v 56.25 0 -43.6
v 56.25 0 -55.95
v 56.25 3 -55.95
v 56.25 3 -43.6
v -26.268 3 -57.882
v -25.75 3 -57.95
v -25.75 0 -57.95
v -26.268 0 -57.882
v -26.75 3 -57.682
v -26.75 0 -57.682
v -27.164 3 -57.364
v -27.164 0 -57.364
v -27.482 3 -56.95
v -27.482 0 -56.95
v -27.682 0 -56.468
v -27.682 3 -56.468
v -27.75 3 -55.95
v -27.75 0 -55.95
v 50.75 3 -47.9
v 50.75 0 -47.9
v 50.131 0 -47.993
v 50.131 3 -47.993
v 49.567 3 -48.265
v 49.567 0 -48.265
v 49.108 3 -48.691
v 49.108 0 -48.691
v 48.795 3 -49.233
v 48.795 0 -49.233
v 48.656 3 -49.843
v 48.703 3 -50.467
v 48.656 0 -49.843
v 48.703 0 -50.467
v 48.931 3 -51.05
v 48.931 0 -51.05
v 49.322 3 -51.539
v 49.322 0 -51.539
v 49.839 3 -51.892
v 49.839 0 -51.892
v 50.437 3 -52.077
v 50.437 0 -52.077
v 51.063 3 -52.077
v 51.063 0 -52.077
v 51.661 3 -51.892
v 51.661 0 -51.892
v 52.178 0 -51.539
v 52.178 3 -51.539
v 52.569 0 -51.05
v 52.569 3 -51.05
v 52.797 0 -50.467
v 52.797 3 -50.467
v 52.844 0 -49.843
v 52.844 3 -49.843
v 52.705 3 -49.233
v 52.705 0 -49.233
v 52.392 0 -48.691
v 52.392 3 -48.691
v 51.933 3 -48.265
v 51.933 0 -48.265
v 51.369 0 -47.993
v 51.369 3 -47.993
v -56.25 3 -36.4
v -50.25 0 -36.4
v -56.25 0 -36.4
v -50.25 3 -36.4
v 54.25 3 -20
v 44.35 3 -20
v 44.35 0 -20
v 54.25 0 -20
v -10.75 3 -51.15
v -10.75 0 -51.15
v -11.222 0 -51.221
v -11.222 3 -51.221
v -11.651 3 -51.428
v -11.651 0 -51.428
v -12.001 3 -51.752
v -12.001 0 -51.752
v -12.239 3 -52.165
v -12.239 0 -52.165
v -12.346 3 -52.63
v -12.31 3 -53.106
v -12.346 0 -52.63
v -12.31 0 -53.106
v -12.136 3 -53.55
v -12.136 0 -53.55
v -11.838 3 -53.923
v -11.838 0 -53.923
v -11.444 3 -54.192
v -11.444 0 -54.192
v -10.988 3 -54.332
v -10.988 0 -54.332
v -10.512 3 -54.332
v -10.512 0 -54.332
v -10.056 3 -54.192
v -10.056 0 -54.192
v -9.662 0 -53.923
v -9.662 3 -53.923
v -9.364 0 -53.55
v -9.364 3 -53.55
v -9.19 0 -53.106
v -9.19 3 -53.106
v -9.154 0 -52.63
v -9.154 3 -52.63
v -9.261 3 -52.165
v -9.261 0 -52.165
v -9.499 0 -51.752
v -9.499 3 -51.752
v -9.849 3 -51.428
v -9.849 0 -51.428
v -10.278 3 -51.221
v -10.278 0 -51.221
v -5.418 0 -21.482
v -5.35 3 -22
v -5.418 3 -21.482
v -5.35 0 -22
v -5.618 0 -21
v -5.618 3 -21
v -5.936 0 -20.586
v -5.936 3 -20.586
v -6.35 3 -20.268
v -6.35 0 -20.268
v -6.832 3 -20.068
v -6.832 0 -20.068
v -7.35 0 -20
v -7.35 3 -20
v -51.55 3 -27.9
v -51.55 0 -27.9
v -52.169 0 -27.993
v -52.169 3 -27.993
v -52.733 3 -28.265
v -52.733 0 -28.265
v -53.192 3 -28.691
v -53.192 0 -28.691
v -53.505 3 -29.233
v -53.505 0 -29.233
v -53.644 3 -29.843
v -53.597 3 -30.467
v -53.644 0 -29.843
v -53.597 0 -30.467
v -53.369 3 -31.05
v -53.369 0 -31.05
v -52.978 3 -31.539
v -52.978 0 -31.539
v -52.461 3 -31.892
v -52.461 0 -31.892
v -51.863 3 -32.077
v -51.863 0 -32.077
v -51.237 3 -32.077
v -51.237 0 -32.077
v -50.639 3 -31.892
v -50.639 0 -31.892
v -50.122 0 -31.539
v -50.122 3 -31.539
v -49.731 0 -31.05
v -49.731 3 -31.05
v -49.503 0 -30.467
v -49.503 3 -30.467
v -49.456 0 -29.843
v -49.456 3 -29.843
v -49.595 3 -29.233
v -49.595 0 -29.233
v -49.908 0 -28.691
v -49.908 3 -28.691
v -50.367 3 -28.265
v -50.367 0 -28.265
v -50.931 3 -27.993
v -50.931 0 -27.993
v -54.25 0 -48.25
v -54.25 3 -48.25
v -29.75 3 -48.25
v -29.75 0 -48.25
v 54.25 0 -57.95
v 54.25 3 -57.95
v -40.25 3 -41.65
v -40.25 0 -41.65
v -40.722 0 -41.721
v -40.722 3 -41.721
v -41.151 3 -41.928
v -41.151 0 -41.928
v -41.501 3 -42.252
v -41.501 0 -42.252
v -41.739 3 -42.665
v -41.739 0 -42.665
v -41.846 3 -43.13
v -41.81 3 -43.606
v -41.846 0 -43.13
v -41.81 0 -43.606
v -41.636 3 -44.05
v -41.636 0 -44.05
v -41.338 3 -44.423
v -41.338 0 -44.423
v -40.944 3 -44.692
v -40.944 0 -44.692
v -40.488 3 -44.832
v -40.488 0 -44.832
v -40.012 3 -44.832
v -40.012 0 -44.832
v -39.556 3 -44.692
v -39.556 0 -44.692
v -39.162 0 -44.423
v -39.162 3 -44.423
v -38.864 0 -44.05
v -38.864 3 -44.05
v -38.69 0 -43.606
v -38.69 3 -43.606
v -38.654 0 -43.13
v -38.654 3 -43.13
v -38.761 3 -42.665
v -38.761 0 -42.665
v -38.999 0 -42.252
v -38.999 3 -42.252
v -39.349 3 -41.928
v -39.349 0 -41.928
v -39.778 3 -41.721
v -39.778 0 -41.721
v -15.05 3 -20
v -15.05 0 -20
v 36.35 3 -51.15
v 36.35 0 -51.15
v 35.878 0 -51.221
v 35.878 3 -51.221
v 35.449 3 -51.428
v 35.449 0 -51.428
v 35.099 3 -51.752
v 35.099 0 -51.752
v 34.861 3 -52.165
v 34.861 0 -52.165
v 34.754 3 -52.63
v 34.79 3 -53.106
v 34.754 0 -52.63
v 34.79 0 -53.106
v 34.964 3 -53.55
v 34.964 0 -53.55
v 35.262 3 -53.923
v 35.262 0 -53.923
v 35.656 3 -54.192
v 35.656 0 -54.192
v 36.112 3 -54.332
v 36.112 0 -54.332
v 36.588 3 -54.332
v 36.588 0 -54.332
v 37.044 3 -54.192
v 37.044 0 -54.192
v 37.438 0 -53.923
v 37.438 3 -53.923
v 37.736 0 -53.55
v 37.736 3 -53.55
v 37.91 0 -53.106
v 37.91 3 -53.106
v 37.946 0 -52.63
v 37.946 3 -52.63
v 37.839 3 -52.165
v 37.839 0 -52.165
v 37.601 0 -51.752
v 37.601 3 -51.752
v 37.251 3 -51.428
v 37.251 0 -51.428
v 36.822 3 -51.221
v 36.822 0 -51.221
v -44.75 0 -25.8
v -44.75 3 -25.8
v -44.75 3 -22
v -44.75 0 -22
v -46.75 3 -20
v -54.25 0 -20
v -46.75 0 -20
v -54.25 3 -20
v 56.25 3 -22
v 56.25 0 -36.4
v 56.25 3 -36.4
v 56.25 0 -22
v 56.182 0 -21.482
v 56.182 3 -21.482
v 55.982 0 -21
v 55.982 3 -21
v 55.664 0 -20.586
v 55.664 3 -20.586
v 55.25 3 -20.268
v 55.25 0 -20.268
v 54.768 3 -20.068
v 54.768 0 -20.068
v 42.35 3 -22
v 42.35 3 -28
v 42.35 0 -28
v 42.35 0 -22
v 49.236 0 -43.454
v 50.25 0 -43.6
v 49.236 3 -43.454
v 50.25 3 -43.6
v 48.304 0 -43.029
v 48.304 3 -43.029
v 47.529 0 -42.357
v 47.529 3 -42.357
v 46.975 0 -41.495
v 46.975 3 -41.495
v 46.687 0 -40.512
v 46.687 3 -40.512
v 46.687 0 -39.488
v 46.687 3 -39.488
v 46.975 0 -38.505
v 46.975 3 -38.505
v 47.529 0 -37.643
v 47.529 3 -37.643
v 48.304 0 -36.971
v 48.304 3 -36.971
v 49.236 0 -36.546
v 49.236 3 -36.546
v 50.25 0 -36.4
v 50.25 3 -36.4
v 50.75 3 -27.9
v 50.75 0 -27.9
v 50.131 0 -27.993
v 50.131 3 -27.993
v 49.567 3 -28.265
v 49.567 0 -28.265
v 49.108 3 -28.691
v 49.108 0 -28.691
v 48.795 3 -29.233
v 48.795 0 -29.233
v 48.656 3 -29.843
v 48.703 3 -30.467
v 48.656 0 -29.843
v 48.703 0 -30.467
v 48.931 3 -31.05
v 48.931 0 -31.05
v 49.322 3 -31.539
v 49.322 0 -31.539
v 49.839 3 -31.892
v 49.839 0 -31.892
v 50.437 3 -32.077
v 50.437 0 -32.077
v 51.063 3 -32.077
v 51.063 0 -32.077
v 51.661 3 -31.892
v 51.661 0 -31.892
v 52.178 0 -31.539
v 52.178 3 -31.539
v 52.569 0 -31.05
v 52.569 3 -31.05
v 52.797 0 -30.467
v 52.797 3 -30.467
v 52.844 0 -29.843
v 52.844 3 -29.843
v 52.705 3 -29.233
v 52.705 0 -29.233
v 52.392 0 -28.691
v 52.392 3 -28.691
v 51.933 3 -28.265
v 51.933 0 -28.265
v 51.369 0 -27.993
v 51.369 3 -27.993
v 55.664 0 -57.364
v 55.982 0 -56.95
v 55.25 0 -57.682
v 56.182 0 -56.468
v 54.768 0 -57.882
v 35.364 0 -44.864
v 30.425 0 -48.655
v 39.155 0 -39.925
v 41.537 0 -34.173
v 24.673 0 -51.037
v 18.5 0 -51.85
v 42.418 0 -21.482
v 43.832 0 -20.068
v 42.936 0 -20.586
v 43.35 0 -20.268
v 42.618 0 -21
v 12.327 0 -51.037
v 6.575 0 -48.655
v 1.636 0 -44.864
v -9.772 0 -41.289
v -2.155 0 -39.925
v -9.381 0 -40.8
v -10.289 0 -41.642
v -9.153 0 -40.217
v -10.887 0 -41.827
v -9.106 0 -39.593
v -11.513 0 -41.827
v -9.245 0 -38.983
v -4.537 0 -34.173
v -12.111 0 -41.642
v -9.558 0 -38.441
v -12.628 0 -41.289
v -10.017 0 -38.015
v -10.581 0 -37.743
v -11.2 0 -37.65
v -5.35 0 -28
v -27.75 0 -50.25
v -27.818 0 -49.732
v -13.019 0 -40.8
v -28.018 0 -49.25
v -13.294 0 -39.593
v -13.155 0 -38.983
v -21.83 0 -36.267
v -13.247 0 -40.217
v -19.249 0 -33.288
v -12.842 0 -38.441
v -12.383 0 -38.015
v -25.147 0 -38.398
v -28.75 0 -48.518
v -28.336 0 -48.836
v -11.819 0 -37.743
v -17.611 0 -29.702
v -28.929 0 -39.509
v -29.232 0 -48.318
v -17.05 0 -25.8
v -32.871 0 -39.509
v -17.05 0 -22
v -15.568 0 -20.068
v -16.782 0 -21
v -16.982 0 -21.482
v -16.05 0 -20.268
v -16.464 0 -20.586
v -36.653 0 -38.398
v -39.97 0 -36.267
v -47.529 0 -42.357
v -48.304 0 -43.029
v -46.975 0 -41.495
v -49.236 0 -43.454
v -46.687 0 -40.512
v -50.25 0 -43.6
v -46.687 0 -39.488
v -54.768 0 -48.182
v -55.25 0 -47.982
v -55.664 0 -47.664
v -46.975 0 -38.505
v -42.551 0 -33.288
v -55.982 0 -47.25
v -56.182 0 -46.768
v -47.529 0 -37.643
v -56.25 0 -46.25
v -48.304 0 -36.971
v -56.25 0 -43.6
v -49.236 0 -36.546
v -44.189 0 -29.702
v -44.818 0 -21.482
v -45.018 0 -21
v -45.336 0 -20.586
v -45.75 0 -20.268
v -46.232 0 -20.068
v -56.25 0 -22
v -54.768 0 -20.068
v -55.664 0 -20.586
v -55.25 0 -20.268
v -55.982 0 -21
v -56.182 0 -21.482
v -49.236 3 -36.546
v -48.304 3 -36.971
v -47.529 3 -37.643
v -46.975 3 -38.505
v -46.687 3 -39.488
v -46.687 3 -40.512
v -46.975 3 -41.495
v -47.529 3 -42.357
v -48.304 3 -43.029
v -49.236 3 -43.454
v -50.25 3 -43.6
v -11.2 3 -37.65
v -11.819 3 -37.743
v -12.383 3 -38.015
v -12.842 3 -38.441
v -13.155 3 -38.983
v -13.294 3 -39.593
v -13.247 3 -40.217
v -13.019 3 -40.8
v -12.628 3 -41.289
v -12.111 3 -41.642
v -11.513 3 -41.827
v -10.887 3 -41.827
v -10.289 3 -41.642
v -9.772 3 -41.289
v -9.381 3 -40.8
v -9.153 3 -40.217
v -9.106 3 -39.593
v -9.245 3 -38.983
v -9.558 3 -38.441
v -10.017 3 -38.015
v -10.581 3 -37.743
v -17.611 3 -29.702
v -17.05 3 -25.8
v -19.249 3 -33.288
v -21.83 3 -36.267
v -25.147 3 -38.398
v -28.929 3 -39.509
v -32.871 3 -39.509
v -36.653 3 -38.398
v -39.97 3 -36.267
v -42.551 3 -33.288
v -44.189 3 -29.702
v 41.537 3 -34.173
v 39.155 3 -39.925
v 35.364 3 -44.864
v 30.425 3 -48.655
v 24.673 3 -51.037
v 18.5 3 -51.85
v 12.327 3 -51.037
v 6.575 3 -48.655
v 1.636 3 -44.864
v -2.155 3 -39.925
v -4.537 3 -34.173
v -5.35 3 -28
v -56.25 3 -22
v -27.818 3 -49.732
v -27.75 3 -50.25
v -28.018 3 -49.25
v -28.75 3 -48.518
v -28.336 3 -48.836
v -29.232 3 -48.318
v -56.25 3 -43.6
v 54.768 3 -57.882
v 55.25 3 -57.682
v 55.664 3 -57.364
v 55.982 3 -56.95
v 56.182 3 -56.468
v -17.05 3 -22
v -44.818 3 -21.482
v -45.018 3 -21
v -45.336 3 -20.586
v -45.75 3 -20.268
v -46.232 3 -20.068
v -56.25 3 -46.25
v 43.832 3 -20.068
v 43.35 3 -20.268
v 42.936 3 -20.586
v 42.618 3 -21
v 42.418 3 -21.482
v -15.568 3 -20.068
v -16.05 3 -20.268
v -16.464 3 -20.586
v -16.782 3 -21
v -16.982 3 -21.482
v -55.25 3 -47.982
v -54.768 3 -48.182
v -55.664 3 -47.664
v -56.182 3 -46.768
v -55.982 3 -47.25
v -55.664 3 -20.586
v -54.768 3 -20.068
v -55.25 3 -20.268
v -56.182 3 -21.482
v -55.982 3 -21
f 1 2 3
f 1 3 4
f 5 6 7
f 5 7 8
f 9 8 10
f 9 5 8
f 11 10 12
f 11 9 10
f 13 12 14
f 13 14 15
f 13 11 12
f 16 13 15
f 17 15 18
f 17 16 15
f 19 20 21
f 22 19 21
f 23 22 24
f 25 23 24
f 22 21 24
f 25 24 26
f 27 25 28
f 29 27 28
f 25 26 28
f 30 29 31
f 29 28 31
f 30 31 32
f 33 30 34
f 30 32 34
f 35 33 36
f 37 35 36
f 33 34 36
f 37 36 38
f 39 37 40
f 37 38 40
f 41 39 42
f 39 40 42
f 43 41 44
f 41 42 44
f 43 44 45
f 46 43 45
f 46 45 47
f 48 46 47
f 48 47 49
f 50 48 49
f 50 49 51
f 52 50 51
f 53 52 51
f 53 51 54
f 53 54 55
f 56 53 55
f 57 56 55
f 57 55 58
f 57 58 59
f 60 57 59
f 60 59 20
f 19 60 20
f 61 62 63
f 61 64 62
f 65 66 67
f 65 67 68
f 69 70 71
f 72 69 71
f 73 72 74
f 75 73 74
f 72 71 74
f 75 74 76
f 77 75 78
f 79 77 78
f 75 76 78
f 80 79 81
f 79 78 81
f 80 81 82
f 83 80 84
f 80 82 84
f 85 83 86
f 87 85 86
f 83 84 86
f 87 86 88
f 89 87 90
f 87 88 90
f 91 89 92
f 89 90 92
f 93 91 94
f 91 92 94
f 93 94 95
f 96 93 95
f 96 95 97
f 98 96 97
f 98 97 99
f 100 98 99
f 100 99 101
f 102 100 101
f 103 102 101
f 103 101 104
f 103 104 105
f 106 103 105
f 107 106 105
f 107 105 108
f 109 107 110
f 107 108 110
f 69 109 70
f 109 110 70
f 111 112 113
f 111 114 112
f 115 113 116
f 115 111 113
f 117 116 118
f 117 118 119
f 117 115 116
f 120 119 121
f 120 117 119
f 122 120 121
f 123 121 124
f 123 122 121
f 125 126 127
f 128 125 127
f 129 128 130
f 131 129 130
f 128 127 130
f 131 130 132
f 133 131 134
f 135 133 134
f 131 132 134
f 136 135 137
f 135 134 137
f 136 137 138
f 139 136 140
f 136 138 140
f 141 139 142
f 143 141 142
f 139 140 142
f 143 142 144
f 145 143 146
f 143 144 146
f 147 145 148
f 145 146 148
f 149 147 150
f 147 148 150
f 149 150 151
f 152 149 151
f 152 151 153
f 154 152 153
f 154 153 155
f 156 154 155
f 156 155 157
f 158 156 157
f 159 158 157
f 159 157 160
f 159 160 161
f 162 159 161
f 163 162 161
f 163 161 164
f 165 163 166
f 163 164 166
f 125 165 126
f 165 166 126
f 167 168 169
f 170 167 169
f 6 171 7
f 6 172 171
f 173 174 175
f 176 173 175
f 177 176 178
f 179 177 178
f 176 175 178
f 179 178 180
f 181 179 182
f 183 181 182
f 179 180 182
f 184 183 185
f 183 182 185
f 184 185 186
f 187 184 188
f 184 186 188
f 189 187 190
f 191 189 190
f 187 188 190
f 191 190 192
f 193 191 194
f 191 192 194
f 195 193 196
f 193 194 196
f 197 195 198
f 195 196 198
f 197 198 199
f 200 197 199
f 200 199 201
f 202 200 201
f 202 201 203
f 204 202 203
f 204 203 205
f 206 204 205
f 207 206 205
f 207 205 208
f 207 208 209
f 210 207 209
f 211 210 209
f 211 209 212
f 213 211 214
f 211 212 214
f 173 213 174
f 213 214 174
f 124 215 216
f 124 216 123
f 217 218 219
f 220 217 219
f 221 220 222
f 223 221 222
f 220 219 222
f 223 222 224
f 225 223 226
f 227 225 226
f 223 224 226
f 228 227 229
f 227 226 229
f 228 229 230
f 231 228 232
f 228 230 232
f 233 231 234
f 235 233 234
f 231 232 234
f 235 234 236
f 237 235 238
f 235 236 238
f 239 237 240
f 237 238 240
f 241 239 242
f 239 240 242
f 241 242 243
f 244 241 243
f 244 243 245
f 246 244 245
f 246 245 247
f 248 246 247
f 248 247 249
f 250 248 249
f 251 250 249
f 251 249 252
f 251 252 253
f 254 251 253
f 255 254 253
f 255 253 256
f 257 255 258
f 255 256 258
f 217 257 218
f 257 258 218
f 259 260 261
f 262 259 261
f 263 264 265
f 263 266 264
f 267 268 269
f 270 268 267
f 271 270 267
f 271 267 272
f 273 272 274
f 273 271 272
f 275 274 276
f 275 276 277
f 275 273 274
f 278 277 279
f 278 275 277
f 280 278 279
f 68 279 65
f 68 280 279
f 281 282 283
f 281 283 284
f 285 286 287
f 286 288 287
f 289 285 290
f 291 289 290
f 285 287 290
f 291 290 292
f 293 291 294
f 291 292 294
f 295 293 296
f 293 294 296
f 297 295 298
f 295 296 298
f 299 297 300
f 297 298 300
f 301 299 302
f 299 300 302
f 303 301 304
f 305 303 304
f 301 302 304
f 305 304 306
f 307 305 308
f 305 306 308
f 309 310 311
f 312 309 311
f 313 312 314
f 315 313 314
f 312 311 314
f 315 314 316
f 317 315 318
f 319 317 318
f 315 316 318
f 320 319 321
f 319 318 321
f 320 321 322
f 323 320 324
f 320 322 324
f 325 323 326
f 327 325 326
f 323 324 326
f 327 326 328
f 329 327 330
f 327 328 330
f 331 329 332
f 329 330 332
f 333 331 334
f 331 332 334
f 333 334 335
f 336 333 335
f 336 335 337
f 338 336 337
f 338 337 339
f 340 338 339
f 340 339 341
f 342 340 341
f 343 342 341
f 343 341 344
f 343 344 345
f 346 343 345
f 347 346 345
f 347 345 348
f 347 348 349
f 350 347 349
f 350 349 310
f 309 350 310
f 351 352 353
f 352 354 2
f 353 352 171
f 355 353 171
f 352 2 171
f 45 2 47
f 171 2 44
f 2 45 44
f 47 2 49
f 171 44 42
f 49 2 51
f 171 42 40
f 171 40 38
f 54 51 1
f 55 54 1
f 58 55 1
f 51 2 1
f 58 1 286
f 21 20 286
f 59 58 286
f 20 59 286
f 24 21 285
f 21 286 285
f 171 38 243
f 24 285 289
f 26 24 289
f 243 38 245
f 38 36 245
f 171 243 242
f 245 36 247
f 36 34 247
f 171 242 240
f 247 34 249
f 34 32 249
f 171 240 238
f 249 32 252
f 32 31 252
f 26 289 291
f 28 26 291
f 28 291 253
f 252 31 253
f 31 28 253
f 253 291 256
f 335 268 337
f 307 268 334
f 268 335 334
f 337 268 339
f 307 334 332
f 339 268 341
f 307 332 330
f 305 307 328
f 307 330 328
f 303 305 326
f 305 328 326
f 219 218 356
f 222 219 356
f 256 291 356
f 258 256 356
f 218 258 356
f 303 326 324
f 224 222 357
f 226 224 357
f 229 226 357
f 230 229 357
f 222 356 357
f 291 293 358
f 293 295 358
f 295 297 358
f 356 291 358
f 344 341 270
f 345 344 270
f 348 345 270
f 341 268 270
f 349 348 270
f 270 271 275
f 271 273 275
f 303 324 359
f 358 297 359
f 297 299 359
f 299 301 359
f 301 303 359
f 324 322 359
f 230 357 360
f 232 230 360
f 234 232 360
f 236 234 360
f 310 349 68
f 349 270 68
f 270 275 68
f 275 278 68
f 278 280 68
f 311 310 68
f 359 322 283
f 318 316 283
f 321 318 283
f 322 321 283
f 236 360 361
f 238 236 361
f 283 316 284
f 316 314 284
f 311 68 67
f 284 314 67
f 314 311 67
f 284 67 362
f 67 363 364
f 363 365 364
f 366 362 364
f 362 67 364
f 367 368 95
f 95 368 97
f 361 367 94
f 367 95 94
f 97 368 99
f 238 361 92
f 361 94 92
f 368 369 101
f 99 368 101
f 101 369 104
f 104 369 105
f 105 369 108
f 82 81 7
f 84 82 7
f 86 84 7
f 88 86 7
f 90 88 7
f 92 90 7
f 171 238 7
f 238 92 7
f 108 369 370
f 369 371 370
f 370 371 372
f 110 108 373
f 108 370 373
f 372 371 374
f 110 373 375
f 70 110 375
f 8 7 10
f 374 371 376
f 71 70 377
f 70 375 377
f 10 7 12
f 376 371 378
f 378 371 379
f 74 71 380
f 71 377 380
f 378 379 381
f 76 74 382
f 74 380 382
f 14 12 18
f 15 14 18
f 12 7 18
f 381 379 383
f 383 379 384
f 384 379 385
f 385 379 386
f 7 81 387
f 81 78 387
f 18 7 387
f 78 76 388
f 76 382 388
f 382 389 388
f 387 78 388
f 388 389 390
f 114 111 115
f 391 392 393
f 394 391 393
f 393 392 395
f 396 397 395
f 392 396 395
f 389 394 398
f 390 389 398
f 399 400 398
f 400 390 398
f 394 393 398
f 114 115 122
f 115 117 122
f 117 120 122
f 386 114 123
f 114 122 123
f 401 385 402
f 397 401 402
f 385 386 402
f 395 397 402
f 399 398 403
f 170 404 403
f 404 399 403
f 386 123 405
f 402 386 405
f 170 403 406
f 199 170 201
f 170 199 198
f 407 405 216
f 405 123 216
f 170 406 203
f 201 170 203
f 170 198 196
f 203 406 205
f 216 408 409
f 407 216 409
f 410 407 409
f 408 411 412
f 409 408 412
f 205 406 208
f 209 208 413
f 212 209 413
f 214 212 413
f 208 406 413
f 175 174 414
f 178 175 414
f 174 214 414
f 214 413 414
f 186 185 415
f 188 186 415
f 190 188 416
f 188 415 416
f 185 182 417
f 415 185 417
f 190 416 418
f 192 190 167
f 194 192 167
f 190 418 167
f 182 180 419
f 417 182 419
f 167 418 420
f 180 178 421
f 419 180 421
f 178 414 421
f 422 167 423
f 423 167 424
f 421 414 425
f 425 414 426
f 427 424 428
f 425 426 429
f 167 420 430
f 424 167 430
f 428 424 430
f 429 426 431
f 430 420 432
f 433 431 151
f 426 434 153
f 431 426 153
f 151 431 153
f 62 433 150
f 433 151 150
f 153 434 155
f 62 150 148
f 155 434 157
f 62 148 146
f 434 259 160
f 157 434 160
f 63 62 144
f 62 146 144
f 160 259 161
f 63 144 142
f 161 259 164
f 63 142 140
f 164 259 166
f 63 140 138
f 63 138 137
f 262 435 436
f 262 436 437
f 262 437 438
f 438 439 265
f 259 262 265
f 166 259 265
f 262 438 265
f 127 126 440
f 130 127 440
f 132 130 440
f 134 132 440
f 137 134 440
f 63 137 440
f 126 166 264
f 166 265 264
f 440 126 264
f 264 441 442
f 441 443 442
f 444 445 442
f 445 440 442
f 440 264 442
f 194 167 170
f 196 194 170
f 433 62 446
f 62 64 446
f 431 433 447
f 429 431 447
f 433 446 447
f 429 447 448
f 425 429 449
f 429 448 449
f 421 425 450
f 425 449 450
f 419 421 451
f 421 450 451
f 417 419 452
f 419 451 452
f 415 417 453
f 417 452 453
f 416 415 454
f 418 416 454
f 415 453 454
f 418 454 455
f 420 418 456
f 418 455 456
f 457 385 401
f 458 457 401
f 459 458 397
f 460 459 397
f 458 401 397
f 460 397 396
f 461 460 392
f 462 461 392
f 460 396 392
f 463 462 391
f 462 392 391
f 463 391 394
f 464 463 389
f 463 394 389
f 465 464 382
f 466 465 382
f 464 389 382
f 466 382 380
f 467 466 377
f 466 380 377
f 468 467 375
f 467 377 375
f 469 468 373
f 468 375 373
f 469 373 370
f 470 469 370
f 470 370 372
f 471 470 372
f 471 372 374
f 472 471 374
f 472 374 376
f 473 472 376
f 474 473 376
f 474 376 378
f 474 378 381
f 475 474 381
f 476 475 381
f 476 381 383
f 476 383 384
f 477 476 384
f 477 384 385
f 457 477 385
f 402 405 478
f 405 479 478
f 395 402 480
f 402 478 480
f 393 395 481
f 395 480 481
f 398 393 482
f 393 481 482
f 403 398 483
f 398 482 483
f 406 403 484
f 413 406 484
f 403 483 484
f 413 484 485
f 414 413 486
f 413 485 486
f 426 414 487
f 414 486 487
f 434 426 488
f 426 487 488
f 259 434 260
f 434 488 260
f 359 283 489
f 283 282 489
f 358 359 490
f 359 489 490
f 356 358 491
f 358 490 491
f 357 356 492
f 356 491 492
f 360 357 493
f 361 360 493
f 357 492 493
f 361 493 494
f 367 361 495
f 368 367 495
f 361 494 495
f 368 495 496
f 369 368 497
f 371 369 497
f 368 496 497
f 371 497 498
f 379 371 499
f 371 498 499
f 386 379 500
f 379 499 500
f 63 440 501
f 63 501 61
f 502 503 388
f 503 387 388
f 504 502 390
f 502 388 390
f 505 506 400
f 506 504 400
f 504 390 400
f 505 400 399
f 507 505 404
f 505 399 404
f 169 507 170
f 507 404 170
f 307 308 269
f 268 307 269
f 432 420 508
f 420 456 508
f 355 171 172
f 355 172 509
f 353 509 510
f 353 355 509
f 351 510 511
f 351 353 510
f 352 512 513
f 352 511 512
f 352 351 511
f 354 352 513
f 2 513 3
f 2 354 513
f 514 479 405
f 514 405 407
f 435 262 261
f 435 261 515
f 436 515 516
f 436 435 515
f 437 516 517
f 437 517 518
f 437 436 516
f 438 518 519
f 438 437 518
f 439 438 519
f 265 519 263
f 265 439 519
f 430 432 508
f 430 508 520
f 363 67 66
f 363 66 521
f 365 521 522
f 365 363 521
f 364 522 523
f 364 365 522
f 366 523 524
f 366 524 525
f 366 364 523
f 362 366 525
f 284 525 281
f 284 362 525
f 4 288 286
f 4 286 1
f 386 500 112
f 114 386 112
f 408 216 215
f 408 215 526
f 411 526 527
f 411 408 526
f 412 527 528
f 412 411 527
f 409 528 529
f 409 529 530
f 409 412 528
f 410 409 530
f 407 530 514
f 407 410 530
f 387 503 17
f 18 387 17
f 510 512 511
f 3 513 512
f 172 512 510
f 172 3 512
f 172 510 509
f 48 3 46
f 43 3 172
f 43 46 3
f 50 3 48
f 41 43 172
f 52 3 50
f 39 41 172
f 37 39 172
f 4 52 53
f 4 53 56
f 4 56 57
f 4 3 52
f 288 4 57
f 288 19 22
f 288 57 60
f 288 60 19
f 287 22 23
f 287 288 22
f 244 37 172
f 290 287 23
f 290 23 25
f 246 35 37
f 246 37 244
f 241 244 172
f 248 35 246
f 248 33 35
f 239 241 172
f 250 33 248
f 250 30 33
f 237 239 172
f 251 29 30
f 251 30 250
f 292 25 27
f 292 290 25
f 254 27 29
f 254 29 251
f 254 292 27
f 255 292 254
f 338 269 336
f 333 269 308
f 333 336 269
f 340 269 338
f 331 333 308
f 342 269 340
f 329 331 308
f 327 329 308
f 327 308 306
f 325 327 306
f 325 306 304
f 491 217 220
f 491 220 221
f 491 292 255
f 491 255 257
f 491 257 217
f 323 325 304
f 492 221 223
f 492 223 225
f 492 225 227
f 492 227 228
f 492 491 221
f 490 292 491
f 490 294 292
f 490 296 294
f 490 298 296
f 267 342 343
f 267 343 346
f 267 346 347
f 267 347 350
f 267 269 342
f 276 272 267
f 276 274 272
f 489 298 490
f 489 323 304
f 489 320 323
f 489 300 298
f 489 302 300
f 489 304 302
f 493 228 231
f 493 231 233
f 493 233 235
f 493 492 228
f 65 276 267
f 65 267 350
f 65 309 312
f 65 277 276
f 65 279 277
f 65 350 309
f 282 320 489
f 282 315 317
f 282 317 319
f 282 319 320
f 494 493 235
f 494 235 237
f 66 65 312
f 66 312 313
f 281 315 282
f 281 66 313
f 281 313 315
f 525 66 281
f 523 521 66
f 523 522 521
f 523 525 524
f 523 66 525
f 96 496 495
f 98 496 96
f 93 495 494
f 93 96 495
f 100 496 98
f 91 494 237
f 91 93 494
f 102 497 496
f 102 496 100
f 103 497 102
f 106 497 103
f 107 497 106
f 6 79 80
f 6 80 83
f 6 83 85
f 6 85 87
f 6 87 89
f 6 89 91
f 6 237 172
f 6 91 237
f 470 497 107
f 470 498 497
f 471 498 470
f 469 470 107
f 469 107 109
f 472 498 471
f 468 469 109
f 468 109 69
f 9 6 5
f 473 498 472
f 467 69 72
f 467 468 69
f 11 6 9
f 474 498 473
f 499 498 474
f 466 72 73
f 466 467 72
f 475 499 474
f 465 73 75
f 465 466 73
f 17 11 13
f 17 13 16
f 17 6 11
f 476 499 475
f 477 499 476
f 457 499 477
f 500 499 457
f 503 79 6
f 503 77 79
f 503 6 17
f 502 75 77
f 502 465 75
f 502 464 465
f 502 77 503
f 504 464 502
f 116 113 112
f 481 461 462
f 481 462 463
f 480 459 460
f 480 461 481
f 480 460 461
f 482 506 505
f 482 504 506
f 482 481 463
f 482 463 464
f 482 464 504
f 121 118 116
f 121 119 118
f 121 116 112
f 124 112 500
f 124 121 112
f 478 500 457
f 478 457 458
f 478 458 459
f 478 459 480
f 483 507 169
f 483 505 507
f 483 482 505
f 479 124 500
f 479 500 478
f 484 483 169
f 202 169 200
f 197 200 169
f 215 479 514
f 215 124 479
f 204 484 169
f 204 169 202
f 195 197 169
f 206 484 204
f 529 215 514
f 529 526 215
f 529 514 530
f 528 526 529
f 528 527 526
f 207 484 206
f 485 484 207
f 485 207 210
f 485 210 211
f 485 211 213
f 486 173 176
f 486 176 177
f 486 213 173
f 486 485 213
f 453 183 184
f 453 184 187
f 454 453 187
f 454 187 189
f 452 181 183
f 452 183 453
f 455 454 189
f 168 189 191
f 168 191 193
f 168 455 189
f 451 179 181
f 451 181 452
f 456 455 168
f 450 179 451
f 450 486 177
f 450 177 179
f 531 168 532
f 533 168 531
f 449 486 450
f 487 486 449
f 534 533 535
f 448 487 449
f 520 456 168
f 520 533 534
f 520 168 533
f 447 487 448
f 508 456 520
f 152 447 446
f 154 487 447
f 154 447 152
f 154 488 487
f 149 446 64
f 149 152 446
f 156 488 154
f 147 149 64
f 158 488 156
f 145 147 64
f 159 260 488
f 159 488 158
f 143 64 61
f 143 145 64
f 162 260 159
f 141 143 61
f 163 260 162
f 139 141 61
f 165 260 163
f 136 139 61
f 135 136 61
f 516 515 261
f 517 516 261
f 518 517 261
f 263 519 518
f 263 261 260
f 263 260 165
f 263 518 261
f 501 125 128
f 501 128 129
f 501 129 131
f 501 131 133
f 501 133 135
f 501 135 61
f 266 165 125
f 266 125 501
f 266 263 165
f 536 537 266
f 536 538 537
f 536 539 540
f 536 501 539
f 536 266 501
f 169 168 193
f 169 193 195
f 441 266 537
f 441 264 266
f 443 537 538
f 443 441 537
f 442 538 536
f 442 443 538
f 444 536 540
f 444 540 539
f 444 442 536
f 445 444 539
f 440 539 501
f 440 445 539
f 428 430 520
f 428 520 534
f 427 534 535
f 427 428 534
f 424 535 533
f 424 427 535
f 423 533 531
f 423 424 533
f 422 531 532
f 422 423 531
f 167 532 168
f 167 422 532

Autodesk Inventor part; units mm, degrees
ref_plane "YZ Plane" through (0, 0, 0) normal (1, 0, 0) x (0, 1, 0)
ref_plane "XZ Plane" through (0, 0, 0) normal (0, 1, 0) x (-1, 0, 0)
ref_plane "XY Plane" through (0, 0, 0) normal (0, 0, 1) x (1, 0, 0)
sketch "Sketch1" plane through (0, 0, 0) normal (0, 1, 0) x (-1, 0, 0)
  line L0 (-56.25, 58.25) -> (56.25, 58.25)
  line L1 (56.25, 58.25) -> (56.25, -58.25)
  line L2 (56.25, -58.25) -> (-56.25, -58.25)
  line L3 (-56.25, -58.25) -> (-56.25, 58.25)
  line L4 (-56.25, 58.25) -> (56.25, -58.25) construction
  line L5 (56.25, 58.25) -> (-56.25, -58.25) construction
  point P0 (0, 0)
  dimension "d0" = 112.5
  dimension "d1" = 116.5
extrude "Extrusion1" add sketch "Sketch1" along normal blind 3
sketch "Sketch2" plane through (0, 3, 0) normal (0, 1, 0) x (1, 0, 0)
  circle A0 centre (18.5, 28) radius 23.85
  circle A1 centre (37, -23.25) radius 13.85
  circle A2 centre (-35, -40.25) radius 13.85
  circle A3 centre (-30.9, 25.8) radius 13.85
  circle A4 centre (0, -23.25) radius 13.85
  line L0 (56.25, 58.25) -> (-56.25, 58.25) projected
  line L1 (-56.25, -58.25) -> (56.25, -58.25) projected
  line L2 (0, -105.9299) -> (0, 123.2086) construction
  line L3 (-76.4777, -40.25) -> (-5.35, -40.25) construction
  line L4 (-123.5447, -23.25) -> (82.5572, -23.25) construction
  line L5 (56.25, -58.25) -> (56.25, 58.25) construction
  point P0 (0, 0)
  dimension "d4" = 47.7
  dimension "d5" = 27.7
  dimension "d6" = 27.7
  dimension "d7" = 27.7
  dimension "d8" = 27.7
  dimension "d9" = 116.5
  dimension "d10" = 112.5
  dimension "d13" = 37
  dimension "d14" = 18.5
  dimension "d15" = 30.9
  dimension "d18" = 18
  dimension "d19" = 35
  dimension "d20" = 35
  dimension "d53" = 28
  dimension "d54" = 25.8
extrude "Extrusion2" cut sketch "Sketch2" against normal blind 5
sketch "Sketch4" plane through (0, 3, 0) normal (0, 1, 0) x (1, 0, 0)
  line L0 (-56.25, 58.25) -> (-56.25, -58.25)
  line L1 (56.25, -58.25) -> (56.25, 58.25)
  line L2 (18.5, -17.4904) -> (18.5, -40.0394) construction
  line L3 (-51.55, 5.4) -> (-51.55, 71.9941) construction
  line L4 (50.75, 5.4) -> (50.75, 69.4565) construction
  line L5 (-73.722, 50) -> (66.5467, 50) construction
  line L6 (66.5467, 30) -> (-76.0779, 30) construction
  circle A0 centre (18.5, 28) radius 23.85
  circle A1 centre (37, -23.25) radius 13.85
  circle A2 centre (-30.9, 25.8) radius 13.85
  circle A3 centre (0, -23.25) radius 13.85
  circle A4 centre (-35, -40.25) radius 13.85
  line L7 (56.25, 58.25) -> (-56.25, 58.25)
  line L8 (-56.25, 58.25) -> (-56.25, -58.25)
  line L9 (-56.25, -58.25) -> (56.25, -58.25)
  line L10 (56.25, -58.25) -> (56.25, 58.25)
  circle A5 centre (-30.9, 25.8) radius 13.85
  circle A6 centre (18.5, 28) radius 23.85
  circle A7 centre (0, -23.25) radius 13.85
  circle A8 centre (37, -23.25) radius 13.85
  circle A9 centre (-35, -40.25) radius 13.85
  line L11 (-56.25, 58.25) -> (-56.25, -58.25)
  line L12 (-56.25, 58.25) -> (-56.25, -58.25)
  line L13 (56.25, -58.25) -> (56.25, 58.25)
  line L14 (56.25, 58.25) -> (56.25, -58.25)
  line L15 (-56.25, 20) -> (-44.75, 20)
  line L16 (-17.05, 20) -> (-5.35, 20)
  line L17 (42.35, 20) -> (56.25, 20)
  line L18 (-56.25, -40.25) -> (-48.85, -40.25)
  circle A10 centre (-35, -40.25) radius 13.85
  circle A11 centre (37, -23.25) radius 13.85
  line L19 (50.85, -23.25) -> (56.25, -23.25)
  circle A12 centre (0, -23.25) radius 13.85
  line L20 (-13.85, -23.25) -> (-13.85, -38.25)
  line L21 (-15.85, -40.25) -> (-21.15, -40.25)
  line L22 (13.85, -23.25) -> (13.85, -31.25)
  line L23 (15.85, -33.25) -> (21.15, -33.25)
  line L24 (23.15, -31.25) -> (23.15, -23.25)
  arc A13 (13.85, -31.25) -> (15.85, -33.25) centre (15.85, -31.25) ccw
  arc A14 (21.15, -33.25) -> (23.15, -31.25) centre (21.15, -31.25) ccw
  arc A15 (-15.85, -40.25) -> (-13.85, -38.25) centre (-15.85, -38.25) ccw
  line L25 (-44.75, 25.8) -> (-44.75, 20)
  circle A16 centre (-30.9, 25.8) radius 13.85 projected
  line L26 (-17.05, 25.8) -> (-17.05, 20)
  line L27 (-5.35, 28) -> (-5.35, 20)
  circle A17 centre (18.5, 28) radius 23.85 projected
  line L28 (42.35, 28) -> (42.35, 20)
  line L29 (-110.6194, 0) -> (115.0669, 0) construction
  line L30 (0, -77.0518) -> (0, 133.3252) construction
  point P0 (-56.25, 17.5733)
  point P1 (-42.0273, 17.5733)
  point P2 (-19.7727, 17.5733)
  point P3 (-2.96, 17.5733)
  point P4 (39.1015, 15.9629)
  point P5 (56.25, 15.9629)
  point P6 (-13.85, -23.25)
  point P7 (-21.15, -40.25)
  point P8 (0, 0)
  point P9 (0, 0)
  point P10 (18.5, -13.25)
  point P11 (18.5, -23.25)
  point P12 (-51.55, 30)
  point P13 (50.75, 50)
  point P14 (50.75, 30)
  point P15 (-13.85, -40.25)
  point P16 (13.85, -33.25)
  point P17 (-56.25, 17.5)
  point P18 (-41.9875, 17.5)
  point P19 (-19.8125, 17.5)
  point P20 (-2.9143, 17.5)
  point P21 (39.1112, 16)
  point P22 (56.25, 16)
  point P23 (-21.15, -40.25)
  point P24 (56.25, 20)
  point P25 (-56.25, 20)
  point P26 (56.25, 0)
  point P27 (-56.25, 0)
  point P28 (-11.2, 39.75)
  dimension "d65" = 27.7
  dimension "d55" = 4.7
  dimension "d56" = 5.5
  dimension "d57" = 13.25
  dimension "d58" = 30
  dimension "d59" = 50
  dimension "d60" = 5.4
  dimension "d61" = 5.4
  dimension "d62" = 18.5
  dimension "d63" = 10
  dimension "d64" = 2
  dimension "d66" = 47.7
  dimension "d67" = 2
  dimension "d68" = 27.7
  dimension "d69" = 23.25
  dimension "d70" = 37
  dimension "d73" = 20
  dimension "d88" = 20
  dimension "d89" = 28
  dimension "d98" = 18.5
  dimension "d99" = 45.05
hole "Hole1" at (-51.55, 3, -30) at (50.75, 3, -50) at (50.75, 3, -30) at (-11.2, 3, -39.75) direction (0, -1, 0) diameter 4.2 end through all
extrude "Extrusion3" cut sketch "Sketch4" against normal blind 10 contours L15 L25 A2 L26 L16 L27 A0 L28 L17 L1 L19 A1 L24 A14 L23 A13 L22 A3 L20 A15 L21 A4 L18 L0 | L18 A4 L21 A15 L20 A3 L22 A13 L23 A14 L24 A1 L19 L1 L9 L0
fillet "Fillet1" radius 2 6 edges at (-56.25, 1.5, -20) (-44.75, 1.5, -20) (-17.05, 1.5, -20) (-5.35, 1.5, -20) (42.35, 1.5, -20) (56.25, 1.5, -20)
sketch "Sketch5" plane through (0, 3, 0) normal (0, 1, 0) x (1, 0, 0)
  line L0 (56.25, 58.25) -> (-56.25, 58.25)
  line L1 (56.25, 58.25) -> (-56.25, 58.25)
  line L2 (-46.75, 25.8) -> (-44.75, 25.8)
  arc A0 (-17.05, 25.8) -> (-44.75, 25.8) centre (-30.9, 25.8) ccw
  arc A1 (-17.05, 25.8) -> (-15.05, 27.8) centre (-17.05, 27.8) ccw
  line L3 (-15.05, 27.8) -> (-15.05, 42.25)
  arc A2 (-13.05, 44.25) -> (-15.05, 42.25) centre (-13.05, 42.25) ccw
  line L4 (-13.05, 44.25) -> (-9.35, 44.25)
  arc A3 (-7.35, 42.25) -> (-9.35, 44.25) centre (-9.35, 42.25) ccw
  line L5 (-7.35, 42.25) -> (-7.35, 29.9796)
  arc A4 (-7.35, 29.9796) -> (-5.35, 27.98) centre (-5.35, 29.98) ccw
  arc A5 (42.35, 27.98) -> (-5.35, 27.98) centre (18.5, 28) ccw
  line L6 (42.35, 27.98) -> (44.35, 27.98)
  line L7 (44.35, 27.98) -> (44.35, 58.25)
  line L8 (44.35, 58.25) -> (-46.75, 58.25)
  line L9 (-46.75, 58.25) -> (-46.75, 25.8)
  line L10 (56.25, 58.25) -> (-56.25, 58.25) projected
  point P0 (0, 0)
  point P1 (0, 0)
  point P2 (-40.25, 43.25)
  point P3 (-10.75, 52.75)
  point P4 (36.35, 52.75)
  point P5 (54.25, 58.25)
  point P6 (-54.25, 58.25)
  dimension "d75" = 5.5
  dimension "d76" = 5.5
  dimension "d77" = 15
  dimension "d78" = 6.5
  dimension "d79" = 36
  dimension "d80" = 8
hole "Hole2" at (-40.25, 3, -43.25) at (-10.75, 3, -52.75) at (36.35, 3, -52.75) direction (0, -1, 0) diameter 3.2 end through all
sketch "Sketch6" plane through (0, 3, 0) normal (0, 1, 0) x (1, 0, 0)
  line L0 (-73.7148, 40) -> (84.1674, 40) construction
  line L1 (56.25, 58.25) -> (-56.25, 58.25) construction
  arc A0 (-50.25, 36.4) -> (-50.25, 43.6) centre (-50.25, 40) ccw
  arc A1 (50.25, 43.6) -> (50.25, 36.4) centre (50.25, 40) ccw
  line L2 (-56.25, 58.25) -> (-56.25, 22) construction
  line L3 (56.25, 22) -> (56.25, 58.25) construction
  line L4 (-50.25, 43.6) -> (-56.25, 43.6)
  line L5 (-50.25, 36.4) -> (-56.25, 36.4)
  line L6 (50.25, 43.6) -> (56.25, 43.6)
  line L7 (56.25, 22) -> (56.25, 58.25) projected
  line L8 (50.25, 36.4) -> (56.25, 36.4)
  line L9 (-56.25, 43.6) -> (-56.25, 36.4)
  point P0 (0, 0)
  point P1 (54.25, 58.25)
  point P2 (-54.25, 58.25)
  point P3 (-56.25, 56.25)
  point P4 (56.25, 56.25)
  dimension "d90" = 18.25
  dimension "d91" = 7.2
  dimension "d92" = 7.2
  dimension "d93" = 6
  dimension "d94" = 6
extrude "Extrusion4" cut sketch "Sketch6" against normal blind 10
sketch "Sketch7" plane through (0, 3, 0) normal (0, 1, 0) x (1, 0, 0)
  line L0 (-56.25, 58.25) -> (-56.25, 43.6) projected
  line L1 (-27.75, 58.25) -> (-56.25, 58.25)
  line L2 (-56.25, 58.25) -> (-56.25, 48.25)
  line L3 (-56.25, 48.25) -> (-27.75, 48.25)
  line L4 (-27.75, 48.25) -> (-27.75, 58.25)
  line L5 (56.25, 58.25) -> (-56.25, 58.25) projected
  point P0 (0, 0)
  point P1 (-56.25, 56.25)
  point P2 (54.25, 58.25)
  point P3 (-54.25, 58.25)
  point P4 (-56.25, 56.25)
  dimension "d100" = 28.5
  dimension "d101" = 10
extrude "Extrusion5" cut sketch "Sketch7" against normal blind 10
sketch "Sketch8" plane through (56.25, 0, -58.25) normal (0, 0, -1) x (-1, 0, 0)
  line L0 (0, 3) -> (84, 3) projected
  line L1 (0, 0) -> (84, 0) projected
  line L2 (84, 3) -> (0, 3)
  line L3 (0, 3) -> (0, 0)
  line L4 (0, 0) -> (84, 0)
  line L5 (84, 0) -> (84, 3)
  point P0 (56.25, 0)
extrude "Extrusion6" cut sketch "Sketch8" against normal blind 0.3
fillet "Fillet3" radius 2 4 edges at (-56.25, 1.5, -48.25) (56.25, 1.5, -57.95) (-27.75, 1.5, -57.95) (-27.75, 1.5, -48.25)
equation "\"d76\" = d75"
properties part number "Bottle clamping plate 1"
